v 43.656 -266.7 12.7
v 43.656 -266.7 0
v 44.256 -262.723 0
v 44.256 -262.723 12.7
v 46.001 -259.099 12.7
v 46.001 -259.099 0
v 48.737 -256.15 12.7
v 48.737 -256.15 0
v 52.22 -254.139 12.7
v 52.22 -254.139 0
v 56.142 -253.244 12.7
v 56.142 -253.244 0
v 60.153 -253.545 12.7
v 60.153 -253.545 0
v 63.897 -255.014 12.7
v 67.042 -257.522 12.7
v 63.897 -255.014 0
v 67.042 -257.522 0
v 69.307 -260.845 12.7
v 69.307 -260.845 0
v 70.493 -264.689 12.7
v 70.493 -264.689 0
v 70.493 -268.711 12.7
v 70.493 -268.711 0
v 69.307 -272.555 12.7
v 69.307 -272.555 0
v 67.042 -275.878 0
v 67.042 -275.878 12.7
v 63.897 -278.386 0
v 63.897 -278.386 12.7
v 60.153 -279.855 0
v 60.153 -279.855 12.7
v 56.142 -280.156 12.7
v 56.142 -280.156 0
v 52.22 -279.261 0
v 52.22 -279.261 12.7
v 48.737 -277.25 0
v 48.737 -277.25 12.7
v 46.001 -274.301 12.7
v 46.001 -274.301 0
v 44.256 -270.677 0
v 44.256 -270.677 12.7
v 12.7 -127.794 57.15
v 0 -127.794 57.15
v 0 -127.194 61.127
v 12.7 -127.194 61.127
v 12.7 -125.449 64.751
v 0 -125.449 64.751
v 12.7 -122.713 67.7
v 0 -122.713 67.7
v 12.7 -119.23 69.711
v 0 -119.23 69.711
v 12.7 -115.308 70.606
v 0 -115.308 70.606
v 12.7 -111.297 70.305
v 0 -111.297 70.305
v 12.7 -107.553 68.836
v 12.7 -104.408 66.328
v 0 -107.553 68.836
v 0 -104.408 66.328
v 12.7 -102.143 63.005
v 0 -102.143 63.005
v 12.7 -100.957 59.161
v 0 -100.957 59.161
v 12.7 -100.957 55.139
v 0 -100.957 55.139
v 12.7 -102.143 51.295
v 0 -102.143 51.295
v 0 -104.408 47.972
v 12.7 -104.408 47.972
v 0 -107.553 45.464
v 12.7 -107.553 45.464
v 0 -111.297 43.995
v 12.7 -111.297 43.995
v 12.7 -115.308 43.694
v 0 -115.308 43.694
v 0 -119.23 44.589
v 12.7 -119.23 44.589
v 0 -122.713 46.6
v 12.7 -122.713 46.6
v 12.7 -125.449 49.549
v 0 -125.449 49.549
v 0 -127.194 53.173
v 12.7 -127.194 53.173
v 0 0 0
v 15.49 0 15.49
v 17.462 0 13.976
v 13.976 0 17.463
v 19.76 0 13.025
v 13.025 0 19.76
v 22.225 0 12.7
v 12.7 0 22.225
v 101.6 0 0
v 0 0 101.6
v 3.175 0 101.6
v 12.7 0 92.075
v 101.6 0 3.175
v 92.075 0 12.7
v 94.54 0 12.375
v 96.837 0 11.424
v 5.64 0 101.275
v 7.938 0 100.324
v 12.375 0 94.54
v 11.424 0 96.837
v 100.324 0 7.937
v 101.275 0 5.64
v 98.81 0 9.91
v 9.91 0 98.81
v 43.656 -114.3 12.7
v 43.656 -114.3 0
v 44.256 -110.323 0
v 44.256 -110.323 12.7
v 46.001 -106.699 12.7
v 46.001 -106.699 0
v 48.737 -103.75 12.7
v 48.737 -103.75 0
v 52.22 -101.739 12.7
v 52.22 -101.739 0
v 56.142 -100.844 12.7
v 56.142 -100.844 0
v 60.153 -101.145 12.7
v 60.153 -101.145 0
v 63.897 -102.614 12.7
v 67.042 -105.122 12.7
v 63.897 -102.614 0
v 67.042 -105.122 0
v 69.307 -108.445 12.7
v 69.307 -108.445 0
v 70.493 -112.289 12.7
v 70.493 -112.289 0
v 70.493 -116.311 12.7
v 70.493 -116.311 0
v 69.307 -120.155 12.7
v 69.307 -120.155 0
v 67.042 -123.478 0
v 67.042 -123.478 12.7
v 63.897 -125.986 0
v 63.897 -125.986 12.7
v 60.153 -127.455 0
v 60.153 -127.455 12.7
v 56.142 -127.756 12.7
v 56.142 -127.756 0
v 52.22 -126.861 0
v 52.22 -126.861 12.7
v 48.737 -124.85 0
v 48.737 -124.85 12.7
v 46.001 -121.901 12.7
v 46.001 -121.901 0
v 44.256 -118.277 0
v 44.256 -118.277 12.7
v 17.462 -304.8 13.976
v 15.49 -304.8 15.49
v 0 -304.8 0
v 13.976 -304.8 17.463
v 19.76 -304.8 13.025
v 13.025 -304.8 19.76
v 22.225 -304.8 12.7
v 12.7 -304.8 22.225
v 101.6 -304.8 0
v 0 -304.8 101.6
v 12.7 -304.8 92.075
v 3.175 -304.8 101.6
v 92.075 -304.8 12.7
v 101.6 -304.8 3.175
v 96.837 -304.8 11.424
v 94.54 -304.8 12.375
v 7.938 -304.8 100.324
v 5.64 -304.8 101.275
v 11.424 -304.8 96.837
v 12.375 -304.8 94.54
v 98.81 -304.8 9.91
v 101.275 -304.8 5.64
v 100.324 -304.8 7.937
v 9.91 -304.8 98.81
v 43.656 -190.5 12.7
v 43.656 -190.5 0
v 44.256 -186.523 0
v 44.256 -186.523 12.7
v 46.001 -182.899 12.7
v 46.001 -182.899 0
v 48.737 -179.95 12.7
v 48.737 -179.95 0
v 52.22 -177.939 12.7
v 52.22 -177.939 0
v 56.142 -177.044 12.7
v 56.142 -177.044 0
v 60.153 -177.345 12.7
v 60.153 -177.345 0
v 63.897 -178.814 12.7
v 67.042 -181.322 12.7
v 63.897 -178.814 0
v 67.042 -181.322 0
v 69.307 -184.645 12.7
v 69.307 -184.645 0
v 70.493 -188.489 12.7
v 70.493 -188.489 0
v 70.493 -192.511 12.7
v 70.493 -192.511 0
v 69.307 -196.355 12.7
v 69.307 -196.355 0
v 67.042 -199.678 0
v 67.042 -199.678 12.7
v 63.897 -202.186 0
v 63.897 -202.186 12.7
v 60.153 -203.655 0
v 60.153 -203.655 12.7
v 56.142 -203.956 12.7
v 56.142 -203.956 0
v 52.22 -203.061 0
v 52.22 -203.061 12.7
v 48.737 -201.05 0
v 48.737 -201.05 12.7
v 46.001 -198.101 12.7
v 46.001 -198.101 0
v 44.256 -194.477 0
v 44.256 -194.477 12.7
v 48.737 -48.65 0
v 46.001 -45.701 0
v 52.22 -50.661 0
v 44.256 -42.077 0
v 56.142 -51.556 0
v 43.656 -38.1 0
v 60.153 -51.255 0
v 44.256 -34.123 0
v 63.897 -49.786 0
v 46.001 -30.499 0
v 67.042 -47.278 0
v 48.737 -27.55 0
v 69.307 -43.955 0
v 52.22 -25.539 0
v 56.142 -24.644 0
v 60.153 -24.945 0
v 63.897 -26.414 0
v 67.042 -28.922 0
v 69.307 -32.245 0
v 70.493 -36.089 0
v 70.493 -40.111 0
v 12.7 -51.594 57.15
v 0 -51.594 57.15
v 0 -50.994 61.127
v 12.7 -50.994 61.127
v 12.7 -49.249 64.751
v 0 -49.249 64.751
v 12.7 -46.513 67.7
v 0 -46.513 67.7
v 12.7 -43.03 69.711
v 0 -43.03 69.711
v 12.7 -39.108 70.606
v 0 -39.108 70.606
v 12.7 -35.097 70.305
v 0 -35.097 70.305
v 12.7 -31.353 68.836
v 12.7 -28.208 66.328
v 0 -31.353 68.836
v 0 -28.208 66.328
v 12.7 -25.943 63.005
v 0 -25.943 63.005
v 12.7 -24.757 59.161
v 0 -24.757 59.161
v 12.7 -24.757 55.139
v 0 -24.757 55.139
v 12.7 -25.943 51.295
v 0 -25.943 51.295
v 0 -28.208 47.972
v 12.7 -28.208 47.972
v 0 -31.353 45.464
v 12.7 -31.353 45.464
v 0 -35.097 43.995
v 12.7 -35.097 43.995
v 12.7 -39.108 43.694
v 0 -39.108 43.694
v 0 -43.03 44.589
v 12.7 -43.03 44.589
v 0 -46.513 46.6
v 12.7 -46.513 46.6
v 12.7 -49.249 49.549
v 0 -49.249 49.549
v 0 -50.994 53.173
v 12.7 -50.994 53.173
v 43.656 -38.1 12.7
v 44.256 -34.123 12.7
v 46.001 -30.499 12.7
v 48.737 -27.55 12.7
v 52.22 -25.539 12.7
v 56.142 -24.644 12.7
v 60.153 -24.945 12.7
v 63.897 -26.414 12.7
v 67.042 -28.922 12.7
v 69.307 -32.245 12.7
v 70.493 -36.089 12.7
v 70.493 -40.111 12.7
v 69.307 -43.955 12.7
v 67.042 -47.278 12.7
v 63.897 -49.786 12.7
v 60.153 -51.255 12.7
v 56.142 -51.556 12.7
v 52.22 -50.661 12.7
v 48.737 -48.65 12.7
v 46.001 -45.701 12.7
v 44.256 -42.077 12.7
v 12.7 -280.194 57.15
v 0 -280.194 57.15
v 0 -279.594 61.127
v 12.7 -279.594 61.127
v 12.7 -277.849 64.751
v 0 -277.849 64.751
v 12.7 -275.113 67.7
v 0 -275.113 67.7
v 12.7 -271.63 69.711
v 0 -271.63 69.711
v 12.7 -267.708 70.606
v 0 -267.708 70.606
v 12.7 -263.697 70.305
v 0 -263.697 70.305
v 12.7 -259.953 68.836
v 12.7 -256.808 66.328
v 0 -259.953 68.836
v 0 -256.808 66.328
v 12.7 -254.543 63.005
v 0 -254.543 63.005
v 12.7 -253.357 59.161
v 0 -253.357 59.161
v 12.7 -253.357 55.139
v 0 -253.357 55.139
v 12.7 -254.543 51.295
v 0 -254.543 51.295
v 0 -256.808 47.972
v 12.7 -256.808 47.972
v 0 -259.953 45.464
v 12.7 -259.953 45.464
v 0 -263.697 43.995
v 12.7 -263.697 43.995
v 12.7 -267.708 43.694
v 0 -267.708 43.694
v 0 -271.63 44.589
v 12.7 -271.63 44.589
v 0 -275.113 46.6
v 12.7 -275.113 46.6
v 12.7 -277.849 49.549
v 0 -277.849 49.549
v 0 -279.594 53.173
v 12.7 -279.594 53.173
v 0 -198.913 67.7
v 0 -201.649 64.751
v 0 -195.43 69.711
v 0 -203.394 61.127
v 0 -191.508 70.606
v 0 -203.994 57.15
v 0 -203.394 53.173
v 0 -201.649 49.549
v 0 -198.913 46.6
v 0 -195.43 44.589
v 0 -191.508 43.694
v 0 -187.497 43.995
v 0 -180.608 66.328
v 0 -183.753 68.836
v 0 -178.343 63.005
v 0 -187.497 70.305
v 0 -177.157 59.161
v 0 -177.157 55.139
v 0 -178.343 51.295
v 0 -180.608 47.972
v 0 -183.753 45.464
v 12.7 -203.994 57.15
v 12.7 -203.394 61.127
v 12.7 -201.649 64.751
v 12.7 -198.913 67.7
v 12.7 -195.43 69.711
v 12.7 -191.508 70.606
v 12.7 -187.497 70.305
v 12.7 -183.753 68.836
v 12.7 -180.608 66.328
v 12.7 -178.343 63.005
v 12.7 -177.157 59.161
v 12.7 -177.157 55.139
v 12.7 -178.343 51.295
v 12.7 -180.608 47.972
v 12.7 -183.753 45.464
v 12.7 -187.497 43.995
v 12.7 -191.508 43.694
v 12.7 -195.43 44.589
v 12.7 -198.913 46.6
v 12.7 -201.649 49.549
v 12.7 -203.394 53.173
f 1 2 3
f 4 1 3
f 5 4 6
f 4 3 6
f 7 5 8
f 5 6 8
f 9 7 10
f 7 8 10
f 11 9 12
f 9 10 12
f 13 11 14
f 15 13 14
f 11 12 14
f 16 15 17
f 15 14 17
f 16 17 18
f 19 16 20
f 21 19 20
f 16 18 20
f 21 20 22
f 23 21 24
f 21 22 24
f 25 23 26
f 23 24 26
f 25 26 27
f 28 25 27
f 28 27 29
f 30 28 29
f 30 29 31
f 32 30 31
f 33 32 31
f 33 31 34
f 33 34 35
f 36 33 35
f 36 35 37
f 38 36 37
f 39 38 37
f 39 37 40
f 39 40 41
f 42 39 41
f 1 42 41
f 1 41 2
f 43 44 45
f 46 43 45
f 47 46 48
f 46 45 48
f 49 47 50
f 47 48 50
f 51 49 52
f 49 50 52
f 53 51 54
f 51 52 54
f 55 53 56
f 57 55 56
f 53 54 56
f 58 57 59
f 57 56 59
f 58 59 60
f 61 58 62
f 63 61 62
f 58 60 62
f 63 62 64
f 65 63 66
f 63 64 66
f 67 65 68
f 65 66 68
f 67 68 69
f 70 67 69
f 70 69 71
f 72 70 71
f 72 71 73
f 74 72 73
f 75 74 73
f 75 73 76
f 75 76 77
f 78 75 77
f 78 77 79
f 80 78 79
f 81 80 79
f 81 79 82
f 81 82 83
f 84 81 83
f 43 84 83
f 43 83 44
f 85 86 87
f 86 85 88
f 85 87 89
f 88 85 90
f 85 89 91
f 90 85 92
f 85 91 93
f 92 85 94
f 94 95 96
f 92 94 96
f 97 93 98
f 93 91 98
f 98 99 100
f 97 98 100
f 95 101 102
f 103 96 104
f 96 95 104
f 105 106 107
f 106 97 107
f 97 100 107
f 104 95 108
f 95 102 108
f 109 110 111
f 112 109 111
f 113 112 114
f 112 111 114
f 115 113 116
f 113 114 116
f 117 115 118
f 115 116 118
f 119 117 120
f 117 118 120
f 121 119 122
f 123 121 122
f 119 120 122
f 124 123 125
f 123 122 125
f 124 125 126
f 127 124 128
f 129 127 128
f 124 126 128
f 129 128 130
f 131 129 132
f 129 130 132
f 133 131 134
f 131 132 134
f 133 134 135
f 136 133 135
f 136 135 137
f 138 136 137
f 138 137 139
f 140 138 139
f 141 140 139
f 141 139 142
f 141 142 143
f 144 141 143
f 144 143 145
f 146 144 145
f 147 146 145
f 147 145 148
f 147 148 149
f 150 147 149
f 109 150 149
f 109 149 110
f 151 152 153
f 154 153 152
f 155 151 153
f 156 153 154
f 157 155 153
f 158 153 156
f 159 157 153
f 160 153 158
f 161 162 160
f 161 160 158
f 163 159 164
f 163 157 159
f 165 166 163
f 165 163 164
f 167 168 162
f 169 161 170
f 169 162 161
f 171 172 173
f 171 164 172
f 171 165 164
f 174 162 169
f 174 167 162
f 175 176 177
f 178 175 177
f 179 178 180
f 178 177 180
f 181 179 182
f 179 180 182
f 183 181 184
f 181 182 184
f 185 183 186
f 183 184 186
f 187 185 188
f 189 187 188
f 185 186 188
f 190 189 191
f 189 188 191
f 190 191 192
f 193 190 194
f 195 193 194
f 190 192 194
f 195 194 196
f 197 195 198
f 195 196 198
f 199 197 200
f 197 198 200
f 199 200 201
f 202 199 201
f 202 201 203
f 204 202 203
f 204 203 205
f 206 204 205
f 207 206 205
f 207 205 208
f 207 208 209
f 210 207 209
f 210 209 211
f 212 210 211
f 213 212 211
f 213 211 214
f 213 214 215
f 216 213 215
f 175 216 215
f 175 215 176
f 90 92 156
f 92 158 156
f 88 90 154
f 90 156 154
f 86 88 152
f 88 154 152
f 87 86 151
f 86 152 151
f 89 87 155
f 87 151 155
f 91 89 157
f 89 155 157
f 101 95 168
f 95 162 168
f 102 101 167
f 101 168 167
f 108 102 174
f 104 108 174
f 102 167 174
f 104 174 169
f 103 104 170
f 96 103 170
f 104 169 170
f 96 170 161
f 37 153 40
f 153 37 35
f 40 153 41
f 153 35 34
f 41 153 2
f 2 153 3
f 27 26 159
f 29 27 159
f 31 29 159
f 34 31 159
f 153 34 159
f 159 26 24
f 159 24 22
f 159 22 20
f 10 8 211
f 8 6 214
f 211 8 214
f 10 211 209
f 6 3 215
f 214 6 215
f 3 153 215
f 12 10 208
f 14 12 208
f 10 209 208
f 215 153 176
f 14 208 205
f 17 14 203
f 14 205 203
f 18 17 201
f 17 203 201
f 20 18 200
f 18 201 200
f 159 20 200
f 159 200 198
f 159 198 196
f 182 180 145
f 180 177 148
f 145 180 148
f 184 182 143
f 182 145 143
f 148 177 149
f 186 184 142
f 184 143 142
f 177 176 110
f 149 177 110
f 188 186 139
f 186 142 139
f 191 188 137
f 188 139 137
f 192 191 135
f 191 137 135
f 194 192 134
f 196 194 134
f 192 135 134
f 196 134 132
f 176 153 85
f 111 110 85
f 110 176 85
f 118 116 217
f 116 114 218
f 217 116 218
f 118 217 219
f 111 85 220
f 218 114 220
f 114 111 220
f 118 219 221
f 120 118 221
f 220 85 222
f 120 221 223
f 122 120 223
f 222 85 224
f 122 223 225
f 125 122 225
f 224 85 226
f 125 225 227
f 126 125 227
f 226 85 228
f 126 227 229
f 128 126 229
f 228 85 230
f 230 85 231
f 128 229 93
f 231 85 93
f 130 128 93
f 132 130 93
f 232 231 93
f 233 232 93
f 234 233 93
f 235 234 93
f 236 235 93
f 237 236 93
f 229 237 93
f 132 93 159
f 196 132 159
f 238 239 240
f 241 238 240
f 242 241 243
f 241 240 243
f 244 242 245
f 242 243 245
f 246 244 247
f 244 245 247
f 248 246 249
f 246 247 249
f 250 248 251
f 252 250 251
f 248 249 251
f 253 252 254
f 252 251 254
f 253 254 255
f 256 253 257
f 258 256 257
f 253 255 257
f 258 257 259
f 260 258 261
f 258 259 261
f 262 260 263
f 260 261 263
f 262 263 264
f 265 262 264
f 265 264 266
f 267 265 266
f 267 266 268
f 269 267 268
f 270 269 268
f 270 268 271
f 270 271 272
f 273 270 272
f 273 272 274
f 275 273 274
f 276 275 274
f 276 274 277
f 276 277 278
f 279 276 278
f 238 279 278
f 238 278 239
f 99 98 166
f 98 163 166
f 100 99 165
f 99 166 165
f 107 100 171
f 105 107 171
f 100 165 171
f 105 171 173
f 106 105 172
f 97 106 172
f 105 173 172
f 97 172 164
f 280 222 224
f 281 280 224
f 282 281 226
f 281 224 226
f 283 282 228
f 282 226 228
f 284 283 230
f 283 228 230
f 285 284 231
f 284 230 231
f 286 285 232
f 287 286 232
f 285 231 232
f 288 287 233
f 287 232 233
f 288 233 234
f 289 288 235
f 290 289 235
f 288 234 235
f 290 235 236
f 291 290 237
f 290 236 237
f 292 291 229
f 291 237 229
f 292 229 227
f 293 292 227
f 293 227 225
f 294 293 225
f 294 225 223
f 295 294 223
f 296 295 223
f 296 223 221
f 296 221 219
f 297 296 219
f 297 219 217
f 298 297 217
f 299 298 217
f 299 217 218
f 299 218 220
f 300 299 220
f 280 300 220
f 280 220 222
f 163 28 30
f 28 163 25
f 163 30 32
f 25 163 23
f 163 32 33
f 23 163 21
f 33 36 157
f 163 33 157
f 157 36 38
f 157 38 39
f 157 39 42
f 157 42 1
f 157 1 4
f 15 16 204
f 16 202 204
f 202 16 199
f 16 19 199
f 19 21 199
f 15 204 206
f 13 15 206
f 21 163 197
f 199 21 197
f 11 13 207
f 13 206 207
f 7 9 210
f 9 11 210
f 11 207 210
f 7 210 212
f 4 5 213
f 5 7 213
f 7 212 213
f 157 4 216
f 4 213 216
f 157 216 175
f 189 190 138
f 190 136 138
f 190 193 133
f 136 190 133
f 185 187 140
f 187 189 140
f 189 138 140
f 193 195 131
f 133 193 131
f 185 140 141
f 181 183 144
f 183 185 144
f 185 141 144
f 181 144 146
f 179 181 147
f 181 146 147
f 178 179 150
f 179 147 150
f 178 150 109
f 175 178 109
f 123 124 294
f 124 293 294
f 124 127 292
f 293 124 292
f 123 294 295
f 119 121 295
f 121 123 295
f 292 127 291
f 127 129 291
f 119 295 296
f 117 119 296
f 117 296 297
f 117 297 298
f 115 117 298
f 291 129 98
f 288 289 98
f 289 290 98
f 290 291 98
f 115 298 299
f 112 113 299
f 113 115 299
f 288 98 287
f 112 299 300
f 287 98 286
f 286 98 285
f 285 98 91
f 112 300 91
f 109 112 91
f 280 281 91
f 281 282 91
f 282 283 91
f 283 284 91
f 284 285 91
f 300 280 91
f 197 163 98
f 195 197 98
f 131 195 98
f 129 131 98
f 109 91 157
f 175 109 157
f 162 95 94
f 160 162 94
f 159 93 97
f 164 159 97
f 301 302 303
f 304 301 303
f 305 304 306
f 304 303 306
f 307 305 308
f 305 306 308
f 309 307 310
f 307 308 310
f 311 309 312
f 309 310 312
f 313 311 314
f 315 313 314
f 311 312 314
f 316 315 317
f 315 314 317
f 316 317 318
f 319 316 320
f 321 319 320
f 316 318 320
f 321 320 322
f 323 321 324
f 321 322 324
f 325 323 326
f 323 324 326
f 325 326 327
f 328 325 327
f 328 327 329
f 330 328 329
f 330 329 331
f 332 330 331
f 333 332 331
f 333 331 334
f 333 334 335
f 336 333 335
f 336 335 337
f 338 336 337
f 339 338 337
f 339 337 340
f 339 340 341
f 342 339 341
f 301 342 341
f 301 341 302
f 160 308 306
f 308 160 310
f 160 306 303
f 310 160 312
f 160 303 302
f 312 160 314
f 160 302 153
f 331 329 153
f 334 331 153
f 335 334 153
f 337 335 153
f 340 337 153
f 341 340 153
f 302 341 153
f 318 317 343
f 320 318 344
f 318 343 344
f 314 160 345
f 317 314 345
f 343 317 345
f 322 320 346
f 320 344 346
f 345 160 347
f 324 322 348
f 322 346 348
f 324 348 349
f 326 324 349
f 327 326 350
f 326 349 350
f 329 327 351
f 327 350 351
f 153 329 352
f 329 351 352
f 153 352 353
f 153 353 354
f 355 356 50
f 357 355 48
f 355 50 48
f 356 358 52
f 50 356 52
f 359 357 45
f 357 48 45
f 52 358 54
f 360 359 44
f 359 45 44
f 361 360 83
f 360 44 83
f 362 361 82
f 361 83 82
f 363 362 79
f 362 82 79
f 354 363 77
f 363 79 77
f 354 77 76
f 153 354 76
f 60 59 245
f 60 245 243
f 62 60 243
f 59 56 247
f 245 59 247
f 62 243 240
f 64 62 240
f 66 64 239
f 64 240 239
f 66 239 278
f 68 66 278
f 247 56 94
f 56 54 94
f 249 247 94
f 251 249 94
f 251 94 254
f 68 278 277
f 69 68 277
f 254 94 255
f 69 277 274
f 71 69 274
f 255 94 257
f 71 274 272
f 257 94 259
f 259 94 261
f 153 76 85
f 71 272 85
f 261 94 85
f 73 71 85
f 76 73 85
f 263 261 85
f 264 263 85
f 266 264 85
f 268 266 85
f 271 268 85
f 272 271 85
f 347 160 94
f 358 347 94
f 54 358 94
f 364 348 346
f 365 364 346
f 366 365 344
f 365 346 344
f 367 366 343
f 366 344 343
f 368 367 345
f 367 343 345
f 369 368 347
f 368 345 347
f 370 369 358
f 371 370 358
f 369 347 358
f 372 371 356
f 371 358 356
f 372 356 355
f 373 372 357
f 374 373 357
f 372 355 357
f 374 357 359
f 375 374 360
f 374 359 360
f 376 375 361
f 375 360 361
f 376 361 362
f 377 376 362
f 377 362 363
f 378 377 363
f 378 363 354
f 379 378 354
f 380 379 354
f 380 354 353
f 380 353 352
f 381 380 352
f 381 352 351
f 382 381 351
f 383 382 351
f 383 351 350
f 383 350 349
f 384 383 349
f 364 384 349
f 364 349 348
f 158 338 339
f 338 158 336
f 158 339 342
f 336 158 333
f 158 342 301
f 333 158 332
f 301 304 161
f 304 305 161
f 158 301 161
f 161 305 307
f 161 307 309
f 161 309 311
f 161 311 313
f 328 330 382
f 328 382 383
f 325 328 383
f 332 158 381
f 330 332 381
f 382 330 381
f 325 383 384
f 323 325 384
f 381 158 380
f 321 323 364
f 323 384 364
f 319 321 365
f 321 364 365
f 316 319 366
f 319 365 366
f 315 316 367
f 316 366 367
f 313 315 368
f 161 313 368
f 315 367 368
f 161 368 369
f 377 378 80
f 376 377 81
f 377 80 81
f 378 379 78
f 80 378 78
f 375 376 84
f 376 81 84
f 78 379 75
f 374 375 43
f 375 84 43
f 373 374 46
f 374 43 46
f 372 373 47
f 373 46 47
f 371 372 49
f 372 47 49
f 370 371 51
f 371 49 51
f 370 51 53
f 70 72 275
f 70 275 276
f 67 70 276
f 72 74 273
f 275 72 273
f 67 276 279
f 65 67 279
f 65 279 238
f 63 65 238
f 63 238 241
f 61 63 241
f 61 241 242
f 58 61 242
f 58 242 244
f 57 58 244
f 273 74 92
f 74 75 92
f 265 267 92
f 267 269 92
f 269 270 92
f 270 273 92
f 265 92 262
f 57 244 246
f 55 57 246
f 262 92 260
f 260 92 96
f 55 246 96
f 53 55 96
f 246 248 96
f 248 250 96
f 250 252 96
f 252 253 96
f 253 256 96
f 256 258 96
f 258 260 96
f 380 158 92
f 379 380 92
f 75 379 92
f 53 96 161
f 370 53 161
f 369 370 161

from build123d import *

# Parameters (mm, degrees)
F1_DEPTH = 304.8
F3_D     = 26.9875
F5_D     = 26.9875
F6_R     = 9.525


with BuildPart() as f1:
    # F0 (on Front) → F1 (new body)
    with BuildSketch(Plane.XZ):
        Polygon((12.7, 101.6), (0, 101.6), (0, 0), (101.6, 0), (101.6, 12.7), (12.7, 12.7), align=None)
    extrude(amount=F1_DEPTH)

    # F3 (through all)
    with Locations(Plane.YZ.offset(12.7)):
        with Locations((-266.7, 57.15), (-190.5, 57.15), (-114.3, 57.15), (-38.1, 57.15)):
            Hole(F3_D / 2)

    # F5 (through all)
    with Locations(Plane.XY.offset(12.7)):
        with Locations((57.15, -38.1), (57.15, -114.3), (57.15, -190.5), (57.15, -266.7)):
            Hole(F5_D / 2)

    # F6
    f6_edges = [f1.edges().sort_by_distance(p)[0] for p in [
        (12.7, -152.4, 101.6),
        (12.7, -152.4, 12.7),
        (101.6, -152.4, 12.7),
    ]]
    fillet(f6_edges, radius=F6_R)


solid = f1.part
